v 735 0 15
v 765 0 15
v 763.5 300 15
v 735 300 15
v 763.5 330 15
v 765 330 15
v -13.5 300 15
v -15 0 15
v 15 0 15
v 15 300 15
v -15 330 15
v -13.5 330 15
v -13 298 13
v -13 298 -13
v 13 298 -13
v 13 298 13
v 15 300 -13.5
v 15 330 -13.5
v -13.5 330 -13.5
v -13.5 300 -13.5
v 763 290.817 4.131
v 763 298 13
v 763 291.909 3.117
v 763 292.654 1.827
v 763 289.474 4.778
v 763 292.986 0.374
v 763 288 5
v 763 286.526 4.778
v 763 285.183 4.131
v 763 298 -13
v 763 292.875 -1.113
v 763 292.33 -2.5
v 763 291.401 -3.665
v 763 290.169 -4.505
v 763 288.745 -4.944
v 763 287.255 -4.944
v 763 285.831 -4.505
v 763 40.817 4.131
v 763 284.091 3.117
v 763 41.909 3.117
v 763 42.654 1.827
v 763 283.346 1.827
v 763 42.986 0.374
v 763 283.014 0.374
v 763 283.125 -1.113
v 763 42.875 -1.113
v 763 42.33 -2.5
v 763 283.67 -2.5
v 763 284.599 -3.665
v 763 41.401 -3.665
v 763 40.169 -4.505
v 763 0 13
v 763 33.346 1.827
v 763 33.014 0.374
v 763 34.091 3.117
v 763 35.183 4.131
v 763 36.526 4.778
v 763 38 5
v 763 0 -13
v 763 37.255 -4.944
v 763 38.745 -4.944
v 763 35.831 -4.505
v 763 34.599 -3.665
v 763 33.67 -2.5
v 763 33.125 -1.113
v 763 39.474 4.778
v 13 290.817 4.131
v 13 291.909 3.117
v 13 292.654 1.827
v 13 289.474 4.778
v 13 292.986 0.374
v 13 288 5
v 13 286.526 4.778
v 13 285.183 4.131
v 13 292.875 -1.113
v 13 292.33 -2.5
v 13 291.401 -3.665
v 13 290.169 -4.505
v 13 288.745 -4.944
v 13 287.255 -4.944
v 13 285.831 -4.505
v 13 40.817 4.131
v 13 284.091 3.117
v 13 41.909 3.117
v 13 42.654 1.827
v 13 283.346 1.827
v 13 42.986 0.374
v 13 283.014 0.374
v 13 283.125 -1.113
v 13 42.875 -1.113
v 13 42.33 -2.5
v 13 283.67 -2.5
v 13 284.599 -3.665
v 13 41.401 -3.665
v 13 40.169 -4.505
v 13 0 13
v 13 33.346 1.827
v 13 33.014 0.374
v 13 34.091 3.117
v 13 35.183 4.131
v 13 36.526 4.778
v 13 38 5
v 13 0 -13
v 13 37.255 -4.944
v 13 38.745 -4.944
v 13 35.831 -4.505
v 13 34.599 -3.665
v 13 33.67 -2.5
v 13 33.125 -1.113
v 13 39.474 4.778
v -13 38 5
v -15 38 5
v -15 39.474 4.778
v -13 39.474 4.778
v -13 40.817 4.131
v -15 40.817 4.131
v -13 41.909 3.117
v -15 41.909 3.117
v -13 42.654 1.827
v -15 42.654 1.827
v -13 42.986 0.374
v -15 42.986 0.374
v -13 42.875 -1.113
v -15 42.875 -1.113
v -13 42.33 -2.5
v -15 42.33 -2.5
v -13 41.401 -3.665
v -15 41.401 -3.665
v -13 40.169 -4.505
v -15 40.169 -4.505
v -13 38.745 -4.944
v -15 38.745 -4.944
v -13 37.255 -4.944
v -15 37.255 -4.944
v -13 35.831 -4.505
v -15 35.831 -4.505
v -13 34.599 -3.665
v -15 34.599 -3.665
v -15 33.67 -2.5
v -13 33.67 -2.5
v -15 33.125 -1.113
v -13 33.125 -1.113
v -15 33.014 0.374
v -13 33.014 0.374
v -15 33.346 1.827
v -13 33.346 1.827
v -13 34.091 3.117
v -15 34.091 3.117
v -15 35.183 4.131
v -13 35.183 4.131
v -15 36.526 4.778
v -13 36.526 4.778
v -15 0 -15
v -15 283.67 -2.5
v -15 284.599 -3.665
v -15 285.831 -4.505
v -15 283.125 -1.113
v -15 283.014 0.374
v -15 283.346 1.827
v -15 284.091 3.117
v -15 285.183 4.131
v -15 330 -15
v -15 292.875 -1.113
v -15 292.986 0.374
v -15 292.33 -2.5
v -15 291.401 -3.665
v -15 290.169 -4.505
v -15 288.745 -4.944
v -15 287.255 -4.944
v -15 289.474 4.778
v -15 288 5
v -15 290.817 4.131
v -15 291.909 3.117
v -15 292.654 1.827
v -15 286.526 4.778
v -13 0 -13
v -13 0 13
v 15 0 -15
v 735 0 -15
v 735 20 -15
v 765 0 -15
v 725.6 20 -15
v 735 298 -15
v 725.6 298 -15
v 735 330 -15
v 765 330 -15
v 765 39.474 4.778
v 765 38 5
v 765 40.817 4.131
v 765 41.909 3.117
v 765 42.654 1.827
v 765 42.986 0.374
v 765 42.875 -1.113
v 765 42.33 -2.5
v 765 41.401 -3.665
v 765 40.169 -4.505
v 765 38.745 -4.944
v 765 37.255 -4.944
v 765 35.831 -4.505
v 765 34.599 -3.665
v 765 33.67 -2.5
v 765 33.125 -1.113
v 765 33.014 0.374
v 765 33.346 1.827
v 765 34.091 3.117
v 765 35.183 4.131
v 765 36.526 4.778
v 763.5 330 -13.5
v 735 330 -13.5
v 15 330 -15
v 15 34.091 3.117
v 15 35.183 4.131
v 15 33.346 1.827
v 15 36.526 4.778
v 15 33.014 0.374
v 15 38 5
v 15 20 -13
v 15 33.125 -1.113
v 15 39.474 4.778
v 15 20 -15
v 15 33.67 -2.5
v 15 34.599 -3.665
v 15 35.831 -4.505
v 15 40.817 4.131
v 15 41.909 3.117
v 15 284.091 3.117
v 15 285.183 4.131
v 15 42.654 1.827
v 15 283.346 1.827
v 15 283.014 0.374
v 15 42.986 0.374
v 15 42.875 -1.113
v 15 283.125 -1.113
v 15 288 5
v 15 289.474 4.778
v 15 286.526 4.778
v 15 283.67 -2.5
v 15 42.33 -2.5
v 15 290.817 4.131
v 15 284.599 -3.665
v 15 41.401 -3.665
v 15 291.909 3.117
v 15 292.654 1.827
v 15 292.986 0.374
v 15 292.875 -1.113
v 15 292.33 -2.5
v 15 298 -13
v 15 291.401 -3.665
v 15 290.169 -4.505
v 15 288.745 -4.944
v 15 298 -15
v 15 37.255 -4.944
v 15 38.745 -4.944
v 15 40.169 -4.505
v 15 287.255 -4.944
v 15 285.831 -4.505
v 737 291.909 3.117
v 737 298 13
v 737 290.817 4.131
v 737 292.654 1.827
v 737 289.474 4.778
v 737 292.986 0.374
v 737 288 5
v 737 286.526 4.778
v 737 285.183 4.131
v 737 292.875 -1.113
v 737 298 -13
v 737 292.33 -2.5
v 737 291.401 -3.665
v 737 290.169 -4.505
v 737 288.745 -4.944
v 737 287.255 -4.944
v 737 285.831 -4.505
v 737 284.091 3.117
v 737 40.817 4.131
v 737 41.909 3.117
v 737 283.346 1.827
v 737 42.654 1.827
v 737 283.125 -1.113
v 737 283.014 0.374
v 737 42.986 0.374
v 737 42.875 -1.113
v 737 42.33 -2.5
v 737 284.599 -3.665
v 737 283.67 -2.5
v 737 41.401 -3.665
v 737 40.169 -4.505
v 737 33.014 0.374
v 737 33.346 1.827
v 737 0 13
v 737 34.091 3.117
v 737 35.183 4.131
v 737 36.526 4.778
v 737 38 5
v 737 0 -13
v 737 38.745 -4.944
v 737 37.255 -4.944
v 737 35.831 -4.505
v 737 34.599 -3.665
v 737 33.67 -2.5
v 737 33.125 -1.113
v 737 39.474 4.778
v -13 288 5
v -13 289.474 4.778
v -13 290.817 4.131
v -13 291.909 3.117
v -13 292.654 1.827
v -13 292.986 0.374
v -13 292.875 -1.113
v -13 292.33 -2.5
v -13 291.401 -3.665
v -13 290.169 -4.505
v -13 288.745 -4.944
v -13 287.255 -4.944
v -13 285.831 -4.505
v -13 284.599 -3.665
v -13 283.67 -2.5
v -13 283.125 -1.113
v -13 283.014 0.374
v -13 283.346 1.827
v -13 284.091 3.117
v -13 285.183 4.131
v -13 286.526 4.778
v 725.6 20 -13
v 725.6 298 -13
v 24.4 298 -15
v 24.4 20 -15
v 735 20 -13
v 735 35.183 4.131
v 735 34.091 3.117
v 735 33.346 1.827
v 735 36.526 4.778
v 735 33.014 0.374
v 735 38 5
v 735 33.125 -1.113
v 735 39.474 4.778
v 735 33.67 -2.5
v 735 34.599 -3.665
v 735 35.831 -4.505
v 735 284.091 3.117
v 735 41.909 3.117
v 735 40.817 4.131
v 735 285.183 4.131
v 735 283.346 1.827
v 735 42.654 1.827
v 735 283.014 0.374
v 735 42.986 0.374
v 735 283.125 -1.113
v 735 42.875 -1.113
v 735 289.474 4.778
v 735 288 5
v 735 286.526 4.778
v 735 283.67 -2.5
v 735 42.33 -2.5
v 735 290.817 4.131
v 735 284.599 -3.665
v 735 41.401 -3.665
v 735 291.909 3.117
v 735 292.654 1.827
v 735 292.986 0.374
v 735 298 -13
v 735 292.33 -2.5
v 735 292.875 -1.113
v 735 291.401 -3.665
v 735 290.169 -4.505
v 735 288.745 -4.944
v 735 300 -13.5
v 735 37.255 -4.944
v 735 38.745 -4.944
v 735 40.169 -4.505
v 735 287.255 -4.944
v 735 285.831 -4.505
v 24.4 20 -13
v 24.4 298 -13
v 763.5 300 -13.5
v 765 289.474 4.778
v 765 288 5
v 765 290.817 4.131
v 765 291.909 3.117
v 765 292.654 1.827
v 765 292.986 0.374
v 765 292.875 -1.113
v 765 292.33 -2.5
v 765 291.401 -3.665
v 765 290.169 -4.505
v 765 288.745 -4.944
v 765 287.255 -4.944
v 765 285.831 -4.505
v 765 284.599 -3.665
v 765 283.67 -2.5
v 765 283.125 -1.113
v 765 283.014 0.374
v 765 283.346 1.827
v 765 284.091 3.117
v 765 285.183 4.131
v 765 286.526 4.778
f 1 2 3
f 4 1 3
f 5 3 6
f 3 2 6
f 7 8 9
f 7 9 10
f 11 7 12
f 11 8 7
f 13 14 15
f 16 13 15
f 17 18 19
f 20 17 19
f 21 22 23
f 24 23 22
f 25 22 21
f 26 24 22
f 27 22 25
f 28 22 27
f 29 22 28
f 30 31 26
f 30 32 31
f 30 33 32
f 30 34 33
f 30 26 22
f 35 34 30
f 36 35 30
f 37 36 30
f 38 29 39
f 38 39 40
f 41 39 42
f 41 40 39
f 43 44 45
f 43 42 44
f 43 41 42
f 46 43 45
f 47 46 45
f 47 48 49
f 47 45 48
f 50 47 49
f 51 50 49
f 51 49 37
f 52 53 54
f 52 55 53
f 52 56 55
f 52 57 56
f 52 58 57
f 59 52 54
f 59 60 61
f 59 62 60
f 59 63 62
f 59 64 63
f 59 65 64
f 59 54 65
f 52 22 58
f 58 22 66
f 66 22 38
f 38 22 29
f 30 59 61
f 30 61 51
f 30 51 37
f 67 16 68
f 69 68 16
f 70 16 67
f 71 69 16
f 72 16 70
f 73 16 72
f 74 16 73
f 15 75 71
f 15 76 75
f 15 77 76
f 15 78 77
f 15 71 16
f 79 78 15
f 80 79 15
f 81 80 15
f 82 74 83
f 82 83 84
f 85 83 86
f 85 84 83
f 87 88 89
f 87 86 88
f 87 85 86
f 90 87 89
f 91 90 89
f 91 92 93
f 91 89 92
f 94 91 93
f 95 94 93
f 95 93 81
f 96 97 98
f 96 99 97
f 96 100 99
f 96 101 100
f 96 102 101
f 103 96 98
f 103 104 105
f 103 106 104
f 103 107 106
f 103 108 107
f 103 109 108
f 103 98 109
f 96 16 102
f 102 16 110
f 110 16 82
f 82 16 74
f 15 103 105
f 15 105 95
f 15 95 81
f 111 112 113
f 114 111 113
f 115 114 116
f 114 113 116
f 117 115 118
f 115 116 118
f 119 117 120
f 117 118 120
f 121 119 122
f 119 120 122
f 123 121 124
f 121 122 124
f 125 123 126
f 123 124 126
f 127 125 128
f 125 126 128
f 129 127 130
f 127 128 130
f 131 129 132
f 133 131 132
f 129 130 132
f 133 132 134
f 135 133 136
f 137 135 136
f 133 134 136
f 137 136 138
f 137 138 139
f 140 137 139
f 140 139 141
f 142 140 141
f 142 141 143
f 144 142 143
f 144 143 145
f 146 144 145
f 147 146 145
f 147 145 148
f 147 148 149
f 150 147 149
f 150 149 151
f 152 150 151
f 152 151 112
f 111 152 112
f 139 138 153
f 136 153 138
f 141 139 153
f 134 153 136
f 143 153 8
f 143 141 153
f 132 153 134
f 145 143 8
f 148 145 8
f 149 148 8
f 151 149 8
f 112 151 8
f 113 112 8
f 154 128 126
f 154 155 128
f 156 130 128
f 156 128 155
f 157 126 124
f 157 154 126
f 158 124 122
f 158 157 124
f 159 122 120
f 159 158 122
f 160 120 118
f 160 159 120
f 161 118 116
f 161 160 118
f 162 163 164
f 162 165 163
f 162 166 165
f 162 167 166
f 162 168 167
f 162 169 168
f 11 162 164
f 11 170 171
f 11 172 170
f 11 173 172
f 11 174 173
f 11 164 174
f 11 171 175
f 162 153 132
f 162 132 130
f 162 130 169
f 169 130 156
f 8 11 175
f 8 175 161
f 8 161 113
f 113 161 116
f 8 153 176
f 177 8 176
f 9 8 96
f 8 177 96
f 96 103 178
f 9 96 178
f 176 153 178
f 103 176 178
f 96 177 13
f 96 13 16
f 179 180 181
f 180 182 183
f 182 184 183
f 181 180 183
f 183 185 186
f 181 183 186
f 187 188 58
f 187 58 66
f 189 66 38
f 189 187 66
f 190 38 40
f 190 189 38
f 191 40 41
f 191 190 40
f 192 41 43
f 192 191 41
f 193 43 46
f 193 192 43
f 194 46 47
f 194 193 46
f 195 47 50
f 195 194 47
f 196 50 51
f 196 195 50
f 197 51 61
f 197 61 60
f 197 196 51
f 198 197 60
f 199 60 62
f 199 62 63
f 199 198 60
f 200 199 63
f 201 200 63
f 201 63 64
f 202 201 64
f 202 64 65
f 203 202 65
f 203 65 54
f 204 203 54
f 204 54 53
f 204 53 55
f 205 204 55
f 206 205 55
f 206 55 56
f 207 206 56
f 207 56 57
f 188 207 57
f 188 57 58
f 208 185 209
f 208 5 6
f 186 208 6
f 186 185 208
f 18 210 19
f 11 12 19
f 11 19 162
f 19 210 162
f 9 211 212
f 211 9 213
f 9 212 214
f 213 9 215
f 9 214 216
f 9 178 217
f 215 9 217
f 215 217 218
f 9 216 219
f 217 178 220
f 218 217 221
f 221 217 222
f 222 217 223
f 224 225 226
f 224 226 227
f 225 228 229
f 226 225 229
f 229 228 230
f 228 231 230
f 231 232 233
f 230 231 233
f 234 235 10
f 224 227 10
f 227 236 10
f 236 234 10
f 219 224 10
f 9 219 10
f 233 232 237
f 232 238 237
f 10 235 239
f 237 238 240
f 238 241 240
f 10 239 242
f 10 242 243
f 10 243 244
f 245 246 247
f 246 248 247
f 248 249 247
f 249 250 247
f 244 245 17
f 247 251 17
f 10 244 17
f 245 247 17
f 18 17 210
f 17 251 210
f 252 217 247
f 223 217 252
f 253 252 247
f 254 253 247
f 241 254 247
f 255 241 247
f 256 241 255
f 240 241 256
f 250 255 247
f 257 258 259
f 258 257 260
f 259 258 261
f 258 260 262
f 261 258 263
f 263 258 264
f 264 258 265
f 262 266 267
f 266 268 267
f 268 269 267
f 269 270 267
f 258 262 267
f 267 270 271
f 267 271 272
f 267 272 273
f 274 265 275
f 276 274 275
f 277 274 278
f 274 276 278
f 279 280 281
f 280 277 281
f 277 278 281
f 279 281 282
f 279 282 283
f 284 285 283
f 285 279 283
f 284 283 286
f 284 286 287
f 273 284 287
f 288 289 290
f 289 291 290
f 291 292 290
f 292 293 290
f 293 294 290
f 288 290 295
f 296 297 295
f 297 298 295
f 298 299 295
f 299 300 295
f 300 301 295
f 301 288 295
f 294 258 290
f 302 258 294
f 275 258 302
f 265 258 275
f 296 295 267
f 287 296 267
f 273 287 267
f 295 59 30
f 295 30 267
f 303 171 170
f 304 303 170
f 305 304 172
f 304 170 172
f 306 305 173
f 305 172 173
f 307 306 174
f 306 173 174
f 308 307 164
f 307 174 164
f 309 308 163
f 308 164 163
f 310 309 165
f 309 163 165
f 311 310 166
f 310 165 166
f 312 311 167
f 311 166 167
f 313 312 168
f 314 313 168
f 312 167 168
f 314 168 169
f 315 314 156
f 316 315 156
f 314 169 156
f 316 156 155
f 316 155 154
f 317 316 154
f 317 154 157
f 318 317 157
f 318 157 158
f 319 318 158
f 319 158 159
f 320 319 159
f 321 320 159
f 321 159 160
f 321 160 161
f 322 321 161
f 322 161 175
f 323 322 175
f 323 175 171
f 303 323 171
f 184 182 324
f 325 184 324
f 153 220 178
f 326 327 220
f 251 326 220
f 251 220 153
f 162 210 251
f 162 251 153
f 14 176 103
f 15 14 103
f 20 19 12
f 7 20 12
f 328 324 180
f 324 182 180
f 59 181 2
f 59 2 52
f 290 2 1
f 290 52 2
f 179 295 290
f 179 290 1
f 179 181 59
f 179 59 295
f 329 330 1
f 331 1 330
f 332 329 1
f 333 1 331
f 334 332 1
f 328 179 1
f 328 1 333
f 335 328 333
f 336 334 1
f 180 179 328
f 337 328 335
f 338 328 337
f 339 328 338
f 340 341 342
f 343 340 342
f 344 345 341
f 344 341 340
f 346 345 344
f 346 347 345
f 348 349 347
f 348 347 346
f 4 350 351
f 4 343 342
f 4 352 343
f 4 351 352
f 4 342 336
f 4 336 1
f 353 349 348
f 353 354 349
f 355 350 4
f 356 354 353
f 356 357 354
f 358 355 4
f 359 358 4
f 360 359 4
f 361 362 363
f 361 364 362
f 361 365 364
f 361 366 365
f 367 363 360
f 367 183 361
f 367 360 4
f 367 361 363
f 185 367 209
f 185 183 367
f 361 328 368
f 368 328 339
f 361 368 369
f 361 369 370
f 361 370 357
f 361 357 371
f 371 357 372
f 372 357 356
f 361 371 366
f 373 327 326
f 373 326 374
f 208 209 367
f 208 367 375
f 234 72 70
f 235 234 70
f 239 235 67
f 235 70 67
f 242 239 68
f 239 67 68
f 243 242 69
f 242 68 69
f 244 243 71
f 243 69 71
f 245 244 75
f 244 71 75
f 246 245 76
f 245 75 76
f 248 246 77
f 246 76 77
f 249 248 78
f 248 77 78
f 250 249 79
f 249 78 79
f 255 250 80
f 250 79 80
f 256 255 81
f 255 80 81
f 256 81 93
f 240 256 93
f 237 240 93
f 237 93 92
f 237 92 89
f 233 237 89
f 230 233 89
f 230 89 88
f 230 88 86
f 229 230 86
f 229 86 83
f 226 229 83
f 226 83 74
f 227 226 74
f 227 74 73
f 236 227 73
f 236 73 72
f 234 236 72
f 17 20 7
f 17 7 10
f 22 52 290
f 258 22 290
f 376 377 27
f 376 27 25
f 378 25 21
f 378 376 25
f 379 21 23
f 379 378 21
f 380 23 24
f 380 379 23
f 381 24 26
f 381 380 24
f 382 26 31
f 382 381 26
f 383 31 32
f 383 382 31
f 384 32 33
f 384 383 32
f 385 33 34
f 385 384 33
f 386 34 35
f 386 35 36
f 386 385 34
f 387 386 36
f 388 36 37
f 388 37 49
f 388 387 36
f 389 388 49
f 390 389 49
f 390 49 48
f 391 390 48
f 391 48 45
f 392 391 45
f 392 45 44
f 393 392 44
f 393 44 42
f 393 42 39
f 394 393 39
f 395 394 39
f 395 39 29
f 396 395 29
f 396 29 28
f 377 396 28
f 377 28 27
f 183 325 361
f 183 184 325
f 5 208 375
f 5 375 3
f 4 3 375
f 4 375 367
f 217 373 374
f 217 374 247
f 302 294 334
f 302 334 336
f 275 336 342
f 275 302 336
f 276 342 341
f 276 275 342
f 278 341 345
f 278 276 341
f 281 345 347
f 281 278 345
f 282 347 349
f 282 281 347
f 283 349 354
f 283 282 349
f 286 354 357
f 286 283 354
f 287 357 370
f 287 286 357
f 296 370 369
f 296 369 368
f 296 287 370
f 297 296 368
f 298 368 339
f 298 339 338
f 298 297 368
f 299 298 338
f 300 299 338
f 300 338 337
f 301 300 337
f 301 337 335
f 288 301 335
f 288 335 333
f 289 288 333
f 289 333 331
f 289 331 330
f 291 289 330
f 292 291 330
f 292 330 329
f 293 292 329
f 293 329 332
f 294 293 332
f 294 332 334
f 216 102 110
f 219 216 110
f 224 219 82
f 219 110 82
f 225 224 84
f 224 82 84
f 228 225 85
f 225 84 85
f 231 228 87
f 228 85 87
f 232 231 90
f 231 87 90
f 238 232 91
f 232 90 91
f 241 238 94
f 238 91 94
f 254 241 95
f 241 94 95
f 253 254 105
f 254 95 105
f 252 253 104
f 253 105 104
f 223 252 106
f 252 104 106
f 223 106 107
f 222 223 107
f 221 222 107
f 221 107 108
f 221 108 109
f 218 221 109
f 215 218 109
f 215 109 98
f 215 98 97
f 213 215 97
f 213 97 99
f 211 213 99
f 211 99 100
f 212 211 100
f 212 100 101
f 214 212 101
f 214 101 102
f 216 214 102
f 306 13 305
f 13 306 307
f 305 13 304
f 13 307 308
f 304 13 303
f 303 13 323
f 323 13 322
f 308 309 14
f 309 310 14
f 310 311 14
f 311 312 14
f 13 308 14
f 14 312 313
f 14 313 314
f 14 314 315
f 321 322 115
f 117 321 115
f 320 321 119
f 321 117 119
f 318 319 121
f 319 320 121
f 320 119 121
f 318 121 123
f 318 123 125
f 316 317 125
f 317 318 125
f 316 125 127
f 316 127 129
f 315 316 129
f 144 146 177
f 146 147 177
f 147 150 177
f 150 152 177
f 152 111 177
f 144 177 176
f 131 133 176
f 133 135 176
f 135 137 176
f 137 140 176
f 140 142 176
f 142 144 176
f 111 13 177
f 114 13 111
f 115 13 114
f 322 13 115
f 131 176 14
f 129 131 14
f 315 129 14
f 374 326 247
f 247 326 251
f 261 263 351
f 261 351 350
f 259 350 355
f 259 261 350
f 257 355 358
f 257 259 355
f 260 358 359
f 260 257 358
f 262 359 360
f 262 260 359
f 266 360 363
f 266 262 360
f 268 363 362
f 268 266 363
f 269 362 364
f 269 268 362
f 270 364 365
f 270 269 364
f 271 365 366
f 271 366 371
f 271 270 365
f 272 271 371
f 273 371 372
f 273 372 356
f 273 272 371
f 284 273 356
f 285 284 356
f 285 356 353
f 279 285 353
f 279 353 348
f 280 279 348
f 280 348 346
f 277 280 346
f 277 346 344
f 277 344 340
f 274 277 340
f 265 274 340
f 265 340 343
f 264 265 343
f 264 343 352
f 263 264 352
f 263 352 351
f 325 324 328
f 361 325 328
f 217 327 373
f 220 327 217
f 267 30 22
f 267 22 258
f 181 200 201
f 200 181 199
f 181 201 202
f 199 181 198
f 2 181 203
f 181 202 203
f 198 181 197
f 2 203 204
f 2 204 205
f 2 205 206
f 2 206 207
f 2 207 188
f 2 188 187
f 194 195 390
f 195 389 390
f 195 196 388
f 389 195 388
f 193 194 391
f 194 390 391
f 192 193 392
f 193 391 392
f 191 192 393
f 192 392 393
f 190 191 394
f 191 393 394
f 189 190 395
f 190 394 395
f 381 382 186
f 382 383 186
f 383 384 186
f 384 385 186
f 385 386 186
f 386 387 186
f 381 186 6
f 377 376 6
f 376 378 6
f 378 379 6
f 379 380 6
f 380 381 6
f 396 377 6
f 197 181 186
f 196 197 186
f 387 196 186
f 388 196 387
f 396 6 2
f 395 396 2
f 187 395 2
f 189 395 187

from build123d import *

# Parameters (mm, degrees)
SKETCH1_W           = 30
SKETCH1_H           = 30
BOSS_EXTRUDE1_DEPTH = 300
SHELL1_T            = -2
SKETCH3_W           = 30
SKETCH3_H           = 30
BOSS_EXTRUDE2_DEPTH = 1.5
SKETCH4_W           = 30
SKETCH4_H           = 30
BOSS_EXTRUDE3_DEPTH = 1.5
SKETCH5_R           = 5
CUT_EXTRUDE1_DEPTH  = 332.700165812
BOSS_EXTRUDE4_DEPTH = 278


with BuildPart() as part:
    # Sketch1 → Boss-Extrude1 (new body)
    with BuildSketch(Plane(origin=(0, 0, 0), x_dir=(1, 0, 0), z_dir=(0, 1, 0))):
        Rectangle(SKETCH1_W, SKETCH1_H)
    extrude(amount=BOSS_EXTRUDE1_DEPTH)

    # Shell1
    shell1_openings = [part.faces().sort_by_distance(p)[0] for p in [
        (0, 0, 0),
    ]]
    offset(amount=SHELL1_T, openings=shell1_openings, kind=Kind.INTERSECTION)



with BuildPart() as body_2:
    # Sketch3 → Boss-Extrude2 (new body)
    with BuildSketch(Plane.ZY.offset(15)):
        with Locations((0, 315)):
            Rectangle(SKETCH3_W, SKETCH3_H)
    extrude(amount=-BOSS_EXTRUDE2_DEPTH)


with BuildPart() as part_1:
    add(part.part)

    add(body_2.part)  # Boss-Extrude3 merges body 2
    # Sketch4 → Boss-Extrude3 (add)
    with BuildSketch(Plane(origin=(0, 0, -15), x_dir=(-1, 0, 0), z_dir=(0, 0, -1))):
        with Locations((0, 315)):
            Rectangle(SKETCH4_W, SKETCH4_H)
    extrude(amount=-BOSS_EXTRUDE3_DEPTH)

    # Sketch5 → Cut-Extrude1 (cut, through all)
    with BuildSketch(Plane.ZY.offset(15)):
        with Locations((0, 288)):
            Circle(SKETCH5_R)
        with Locations((0, 38)):
            Circle(SKETCH5_R)
    extrude(amount=-CUT_EXTRUDE1_DEPTH, mode=Mode.SUBTRACT)

    # Sketch7 → Boss-Extrude4 (add)
    with BuildSketch(Plane(origin=(0, 20, 0), x_dir=(-1, 0, 0), z_dir=(0, -1, 0))):
        Polygon((-13, 13), (-13, 15), (-15, 15), (-24.4, 15), (-24.4, 13), align=None)
    extrude(amount=-BOSS_EXTRUDE4_DEPTH)


with BuildPart() as body_2_2:
    # Mirror5: mirrored copy
    add(part_1.part.mirror(Plane.ZY.offset(-375)))


solid = Compound([part_1.part, body_2_2.part])
